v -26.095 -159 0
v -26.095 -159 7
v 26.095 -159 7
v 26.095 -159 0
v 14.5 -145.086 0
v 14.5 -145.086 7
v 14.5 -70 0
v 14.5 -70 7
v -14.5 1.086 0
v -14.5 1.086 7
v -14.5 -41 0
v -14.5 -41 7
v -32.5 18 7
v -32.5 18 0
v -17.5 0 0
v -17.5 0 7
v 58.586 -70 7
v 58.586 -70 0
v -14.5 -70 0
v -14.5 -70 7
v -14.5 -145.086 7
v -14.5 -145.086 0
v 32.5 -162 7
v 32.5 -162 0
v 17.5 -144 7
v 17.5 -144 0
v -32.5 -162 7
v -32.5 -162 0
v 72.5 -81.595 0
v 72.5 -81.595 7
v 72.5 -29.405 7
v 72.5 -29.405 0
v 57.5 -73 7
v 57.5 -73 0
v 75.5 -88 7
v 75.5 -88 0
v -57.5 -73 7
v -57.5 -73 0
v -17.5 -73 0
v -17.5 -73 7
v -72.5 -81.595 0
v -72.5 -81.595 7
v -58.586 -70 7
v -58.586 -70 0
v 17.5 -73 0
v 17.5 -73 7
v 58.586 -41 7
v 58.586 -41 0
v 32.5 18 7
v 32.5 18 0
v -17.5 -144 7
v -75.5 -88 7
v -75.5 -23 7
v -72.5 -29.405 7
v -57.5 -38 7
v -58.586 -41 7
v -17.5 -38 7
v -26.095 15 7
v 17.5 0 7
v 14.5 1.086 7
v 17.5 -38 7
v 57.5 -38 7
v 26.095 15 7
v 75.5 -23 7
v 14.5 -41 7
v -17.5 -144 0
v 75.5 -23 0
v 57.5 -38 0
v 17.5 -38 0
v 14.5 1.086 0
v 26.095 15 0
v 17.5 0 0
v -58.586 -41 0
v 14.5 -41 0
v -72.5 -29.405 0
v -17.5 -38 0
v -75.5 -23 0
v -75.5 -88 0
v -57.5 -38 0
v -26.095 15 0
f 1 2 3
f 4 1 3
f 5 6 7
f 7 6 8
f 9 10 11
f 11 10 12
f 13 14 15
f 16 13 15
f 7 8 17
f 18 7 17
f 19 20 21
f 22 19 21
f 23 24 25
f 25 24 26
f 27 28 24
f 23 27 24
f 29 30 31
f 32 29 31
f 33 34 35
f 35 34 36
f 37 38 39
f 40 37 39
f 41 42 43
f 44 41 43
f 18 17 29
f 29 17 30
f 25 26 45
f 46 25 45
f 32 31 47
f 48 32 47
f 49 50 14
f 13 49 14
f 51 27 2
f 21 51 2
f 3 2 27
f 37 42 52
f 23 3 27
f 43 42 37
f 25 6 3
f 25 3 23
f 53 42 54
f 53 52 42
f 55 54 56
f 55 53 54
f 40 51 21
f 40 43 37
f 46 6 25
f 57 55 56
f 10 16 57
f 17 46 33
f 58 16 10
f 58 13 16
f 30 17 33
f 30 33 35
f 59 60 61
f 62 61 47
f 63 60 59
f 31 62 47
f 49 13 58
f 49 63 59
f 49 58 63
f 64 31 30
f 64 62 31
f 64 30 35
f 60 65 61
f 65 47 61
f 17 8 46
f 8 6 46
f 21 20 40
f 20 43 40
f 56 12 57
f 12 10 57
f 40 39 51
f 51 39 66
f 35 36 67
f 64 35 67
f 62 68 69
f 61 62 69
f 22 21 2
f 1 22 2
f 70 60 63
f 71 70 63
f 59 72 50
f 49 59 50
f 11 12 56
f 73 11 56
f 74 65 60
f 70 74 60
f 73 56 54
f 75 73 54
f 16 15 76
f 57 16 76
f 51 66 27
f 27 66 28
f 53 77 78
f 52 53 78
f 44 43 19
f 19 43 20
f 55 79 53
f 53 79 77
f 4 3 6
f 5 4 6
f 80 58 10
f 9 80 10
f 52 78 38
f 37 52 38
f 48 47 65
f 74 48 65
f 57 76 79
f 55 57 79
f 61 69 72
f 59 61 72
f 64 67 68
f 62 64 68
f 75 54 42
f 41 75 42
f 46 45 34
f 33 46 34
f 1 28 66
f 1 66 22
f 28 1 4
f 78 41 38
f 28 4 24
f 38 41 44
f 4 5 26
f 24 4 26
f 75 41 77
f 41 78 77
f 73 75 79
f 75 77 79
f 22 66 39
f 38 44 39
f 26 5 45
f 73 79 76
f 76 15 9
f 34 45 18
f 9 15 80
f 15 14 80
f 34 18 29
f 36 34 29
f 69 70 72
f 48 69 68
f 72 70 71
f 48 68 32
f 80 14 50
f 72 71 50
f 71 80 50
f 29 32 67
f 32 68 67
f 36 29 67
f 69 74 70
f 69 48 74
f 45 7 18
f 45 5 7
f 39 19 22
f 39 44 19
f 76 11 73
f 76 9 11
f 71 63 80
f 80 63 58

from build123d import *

# Parameters (mm, degrees)
F1_DEPTH = 7
F2_T     = -3
F3_DEPTH = 25


with BuildPart() as f1:
    # F0 (on Top) → F1 (new body)
    with BuildSketch(Plane.XY):
        Polygon((-32.5, 18), (-17.5, 0), (-17.5, -38), (-57.5, -38), (-75.5, -23), (-75.5, -88), (-57.5, -73), (-17.5, -73), (-17.5, -144), (-32.5, -162), (32.5, -162), (17.5, -144), (17.5, -73), (57.5, -73), (75.5, -88), (75.5, -23), (57.5, -38), (17.5, -38), (17.5, 0), (32.5, 18), align=None)
    extrude(amount=F1_DEPTH)

    # F2
    f2_openings = [f1.faces().sort_by_distance(p)[0] for p in [
        (0, -65.365385, 7),
    ]]
    offset(amount=F2_T, openings=f2_openings, kind=Kind.INTERSECTION)

    # F3 (cut): a face of the model
    f3_faces = [f1.faces().sort_by_distance(p)[0] for p in [
        (0, -65.2824145306, 3),
    ]]
    extrude(f3_faces, amount=-F3_DEPTH, mode=Mode.SUBTRACT)


solid = f1.part
